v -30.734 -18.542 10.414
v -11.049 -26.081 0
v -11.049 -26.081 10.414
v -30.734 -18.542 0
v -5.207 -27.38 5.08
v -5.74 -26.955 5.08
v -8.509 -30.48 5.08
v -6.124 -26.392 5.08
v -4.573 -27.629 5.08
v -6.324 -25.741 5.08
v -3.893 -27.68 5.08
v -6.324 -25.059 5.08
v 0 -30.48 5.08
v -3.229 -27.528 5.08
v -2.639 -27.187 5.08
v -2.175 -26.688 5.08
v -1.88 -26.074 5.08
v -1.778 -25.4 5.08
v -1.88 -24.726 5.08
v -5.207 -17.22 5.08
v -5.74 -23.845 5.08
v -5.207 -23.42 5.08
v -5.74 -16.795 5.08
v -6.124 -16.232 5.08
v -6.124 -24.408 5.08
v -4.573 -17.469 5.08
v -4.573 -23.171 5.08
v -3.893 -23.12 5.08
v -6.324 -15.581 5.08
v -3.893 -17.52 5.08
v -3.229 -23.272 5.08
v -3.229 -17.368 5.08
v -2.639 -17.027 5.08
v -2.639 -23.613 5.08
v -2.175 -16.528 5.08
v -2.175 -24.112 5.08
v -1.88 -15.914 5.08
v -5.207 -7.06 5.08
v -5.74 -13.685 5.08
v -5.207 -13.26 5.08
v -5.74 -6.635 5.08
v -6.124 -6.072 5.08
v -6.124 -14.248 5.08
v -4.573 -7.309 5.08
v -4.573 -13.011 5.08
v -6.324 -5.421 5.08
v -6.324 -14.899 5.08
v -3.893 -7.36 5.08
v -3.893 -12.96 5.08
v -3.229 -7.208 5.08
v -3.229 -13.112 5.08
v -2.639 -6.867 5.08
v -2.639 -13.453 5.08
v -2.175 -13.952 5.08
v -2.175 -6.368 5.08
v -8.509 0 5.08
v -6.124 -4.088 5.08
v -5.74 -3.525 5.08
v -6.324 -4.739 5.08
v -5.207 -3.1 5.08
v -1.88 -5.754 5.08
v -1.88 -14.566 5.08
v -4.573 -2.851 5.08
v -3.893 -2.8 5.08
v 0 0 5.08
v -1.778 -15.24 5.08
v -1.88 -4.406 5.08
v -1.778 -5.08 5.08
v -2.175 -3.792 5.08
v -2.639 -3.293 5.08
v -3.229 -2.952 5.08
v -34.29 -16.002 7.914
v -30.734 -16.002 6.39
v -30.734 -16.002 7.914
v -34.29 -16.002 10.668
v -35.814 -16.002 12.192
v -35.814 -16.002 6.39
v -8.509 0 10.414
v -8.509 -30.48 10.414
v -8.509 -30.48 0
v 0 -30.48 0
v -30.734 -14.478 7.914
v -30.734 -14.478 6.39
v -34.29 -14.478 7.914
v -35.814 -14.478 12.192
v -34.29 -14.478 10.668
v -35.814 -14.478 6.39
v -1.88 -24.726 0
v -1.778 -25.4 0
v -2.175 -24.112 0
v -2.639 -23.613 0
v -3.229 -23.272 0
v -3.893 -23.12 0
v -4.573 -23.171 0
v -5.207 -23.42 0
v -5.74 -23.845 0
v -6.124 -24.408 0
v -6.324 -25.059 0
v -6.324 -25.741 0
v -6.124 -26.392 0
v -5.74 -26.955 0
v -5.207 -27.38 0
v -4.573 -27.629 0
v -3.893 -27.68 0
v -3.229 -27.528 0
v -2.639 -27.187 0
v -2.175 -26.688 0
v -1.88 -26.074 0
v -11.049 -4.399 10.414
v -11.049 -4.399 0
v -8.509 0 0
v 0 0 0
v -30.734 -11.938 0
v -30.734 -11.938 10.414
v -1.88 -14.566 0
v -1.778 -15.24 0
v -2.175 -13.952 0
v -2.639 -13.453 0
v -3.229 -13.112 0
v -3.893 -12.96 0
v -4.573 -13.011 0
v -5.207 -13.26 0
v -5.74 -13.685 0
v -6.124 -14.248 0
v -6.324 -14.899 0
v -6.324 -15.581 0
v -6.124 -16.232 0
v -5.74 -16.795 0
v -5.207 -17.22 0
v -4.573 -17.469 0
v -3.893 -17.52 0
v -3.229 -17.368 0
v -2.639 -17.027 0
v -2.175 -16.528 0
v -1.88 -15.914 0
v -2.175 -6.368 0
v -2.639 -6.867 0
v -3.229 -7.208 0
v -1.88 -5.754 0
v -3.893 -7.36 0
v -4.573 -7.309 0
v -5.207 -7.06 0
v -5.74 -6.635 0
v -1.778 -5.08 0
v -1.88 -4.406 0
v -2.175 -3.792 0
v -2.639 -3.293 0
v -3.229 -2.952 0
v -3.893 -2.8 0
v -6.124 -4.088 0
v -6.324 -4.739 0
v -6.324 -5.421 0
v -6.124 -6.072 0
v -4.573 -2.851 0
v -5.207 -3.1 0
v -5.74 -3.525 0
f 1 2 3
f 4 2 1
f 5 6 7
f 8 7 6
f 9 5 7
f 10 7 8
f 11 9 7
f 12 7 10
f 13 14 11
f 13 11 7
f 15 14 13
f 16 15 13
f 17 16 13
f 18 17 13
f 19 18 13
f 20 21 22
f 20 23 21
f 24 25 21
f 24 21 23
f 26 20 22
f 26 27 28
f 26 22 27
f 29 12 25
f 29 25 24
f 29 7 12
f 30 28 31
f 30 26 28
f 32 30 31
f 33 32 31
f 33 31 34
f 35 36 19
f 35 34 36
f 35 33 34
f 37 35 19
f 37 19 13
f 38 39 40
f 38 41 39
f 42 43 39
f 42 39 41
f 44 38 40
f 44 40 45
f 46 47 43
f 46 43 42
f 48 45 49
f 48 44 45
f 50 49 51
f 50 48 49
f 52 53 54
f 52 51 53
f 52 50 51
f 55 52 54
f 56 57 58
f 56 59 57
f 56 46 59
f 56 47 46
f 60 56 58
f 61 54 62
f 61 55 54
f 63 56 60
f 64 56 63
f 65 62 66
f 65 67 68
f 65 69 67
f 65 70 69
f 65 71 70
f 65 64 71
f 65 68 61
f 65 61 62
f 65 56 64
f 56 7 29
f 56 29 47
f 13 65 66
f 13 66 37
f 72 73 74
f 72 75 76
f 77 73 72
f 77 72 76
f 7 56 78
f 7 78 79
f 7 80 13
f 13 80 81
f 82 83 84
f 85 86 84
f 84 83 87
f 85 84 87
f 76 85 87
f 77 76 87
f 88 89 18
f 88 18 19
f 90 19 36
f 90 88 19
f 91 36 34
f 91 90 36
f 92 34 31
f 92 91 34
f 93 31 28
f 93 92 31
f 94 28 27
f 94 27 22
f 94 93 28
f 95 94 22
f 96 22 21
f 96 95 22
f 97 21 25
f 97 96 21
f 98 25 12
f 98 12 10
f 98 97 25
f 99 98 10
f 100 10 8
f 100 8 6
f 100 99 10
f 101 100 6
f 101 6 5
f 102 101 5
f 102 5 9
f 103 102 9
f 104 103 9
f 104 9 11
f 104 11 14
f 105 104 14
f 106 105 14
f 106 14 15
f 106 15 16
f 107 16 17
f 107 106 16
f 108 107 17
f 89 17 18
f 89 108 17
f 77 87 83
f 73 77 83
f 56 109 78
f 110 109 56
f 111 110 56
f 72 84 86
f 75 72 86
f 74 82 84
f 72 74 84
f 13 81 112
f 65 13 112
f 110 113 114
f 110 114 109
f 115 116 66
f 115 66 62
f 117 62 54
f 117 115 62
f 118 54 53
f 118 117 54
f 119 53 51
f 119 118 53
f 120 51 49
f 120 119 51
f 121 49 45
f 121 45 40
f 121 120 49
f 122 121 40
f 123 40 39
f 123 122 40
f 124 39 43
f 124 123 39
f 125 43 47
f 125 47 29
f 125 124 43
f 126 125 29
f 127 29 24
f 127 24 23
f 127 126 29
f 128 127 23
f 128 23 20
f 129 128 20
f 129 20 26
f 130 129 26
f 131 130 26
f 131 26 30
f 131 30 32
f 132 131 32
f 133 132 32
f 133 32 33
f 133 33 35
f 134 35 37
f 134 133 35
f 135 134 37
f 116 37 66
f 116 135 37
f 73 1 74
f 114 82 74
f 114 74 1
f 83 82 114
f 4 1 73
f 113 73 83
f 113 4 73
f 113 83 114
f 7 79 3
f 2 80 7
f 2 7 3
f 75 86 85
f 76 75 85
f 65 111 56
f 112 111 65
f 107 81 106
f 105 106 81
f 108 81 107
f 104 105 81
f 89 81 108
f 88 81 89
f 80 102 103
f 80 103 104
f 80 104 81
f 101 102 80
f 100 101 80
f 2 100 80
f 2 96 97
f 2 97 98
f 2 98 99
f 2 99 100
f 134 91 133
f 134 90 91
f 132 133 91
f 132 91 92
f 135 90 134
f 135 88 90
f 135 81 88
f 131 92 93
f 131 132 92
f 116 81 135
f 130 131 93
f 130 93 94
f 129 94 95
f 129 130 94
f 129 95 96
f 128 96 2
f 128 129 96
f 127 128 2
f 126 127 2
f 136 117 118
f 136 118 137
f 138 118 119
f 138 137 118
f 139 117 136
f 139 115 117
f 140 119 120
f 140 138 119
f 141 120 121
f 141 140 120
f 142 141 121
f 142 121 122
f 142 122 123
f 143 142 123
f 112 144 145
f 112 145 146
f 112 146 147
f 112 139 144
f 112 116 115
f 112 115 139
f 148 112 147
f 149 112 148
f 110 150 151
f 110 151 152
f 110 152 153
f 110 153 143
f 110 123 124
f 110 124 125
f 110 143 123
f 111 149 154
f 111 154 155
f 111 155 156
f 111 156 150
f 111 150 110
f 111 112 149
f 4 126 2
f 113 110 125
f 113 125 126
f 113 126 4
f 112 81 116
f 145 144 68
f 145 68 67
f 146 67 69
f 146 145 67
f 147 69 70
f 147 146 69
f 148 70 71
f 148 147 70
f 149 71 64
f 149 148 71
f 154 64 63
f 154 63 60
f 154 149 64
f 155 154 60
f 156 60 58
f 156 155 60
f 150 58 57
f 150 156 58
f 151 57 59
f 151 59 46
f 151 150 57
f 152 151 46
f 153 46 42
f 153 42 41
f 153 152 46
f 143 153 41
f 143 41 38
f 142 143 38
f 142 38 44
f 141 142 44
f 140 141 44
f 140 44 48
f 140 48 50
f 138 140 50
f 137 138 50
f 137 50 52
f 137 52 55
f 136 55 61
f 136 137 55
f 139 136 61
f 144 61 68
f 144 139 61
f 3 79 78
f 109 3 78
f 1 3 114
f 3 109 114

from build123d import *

# Parameters (mm, degrees)
SKETCH1_W                = 8.509
SKETCH1_H                = 30.48
SKETCH1_R                = 2.286
BOSS_EXTRUDE1_DEPTH      = 5.08
BOSS_EXTRUDE2_DEPTH      = 10.414
BOSS_EXTRUDE3_DEPTH      = 0.762
BOSS_EXTRUDE3_DEPTH_BACK = 0.762


with BuildPart() as part:
    # Sketch1 → Boss-Extrude1 (new body)
    with BuildSketch(Plane.XY):
        with Locations((-4.2545, -15.24)):
            Rectangle(SKETCH1_W, SKETCH1_H)
        with Locations((-4.064, -25.4)):
            Circle(SKETCH1_R, mode=Mode.SUBTRACT)
        with Locations((-4.064, -15.24)):
            Circle(SKETCH1_R, mode=Mode.SUBTRACT)
        with Locations((-4.064, -5.08)):
            Circle(SKETCH1_R, mode=Mode.SUBTRACT)
    extrude(amount=BOSS_EXTRUDE1_DEPTH)

    # Sketch1<3> → Boss-Extrude2 (add)
    with BuildSketch(Plane.XY):
        Polygon((-8.509, -30.48), (-8.509, 0), (-11.049, -4.399409051), (-30.734, -11.938), (-30.734, -15.015), (-30.734, -15.465), (-30.734, -18.542), (-11.049, -26.080590949), align=None)
    extrude(amount=BOSS_EXTRUDE2_DEPTH)

    # Sketch2 → Boss-Extrude3 (add, two sides: drawn at the far end of the back side and taken through both)
    with BuildSketch(Plane(origin=(0, -15.24, 0), x_dir=(-1, 0, 0), z_dir=(0, -1, 0)).offset(-BOSS_EXTRUDE3_DEPTH_BACK)):
        Polygon((35.814, -6.39), (30.734, -6.39), (30.734, -7.914), (34.29, -7.914), (34.29, -10.668), (35.814, -12.192), align=None)
    extrude(amount=BOSS_EXTRUDE3_DEPTH + BOSS_EXTRUDE3_DEPTH_BACK)


solid = part.part
